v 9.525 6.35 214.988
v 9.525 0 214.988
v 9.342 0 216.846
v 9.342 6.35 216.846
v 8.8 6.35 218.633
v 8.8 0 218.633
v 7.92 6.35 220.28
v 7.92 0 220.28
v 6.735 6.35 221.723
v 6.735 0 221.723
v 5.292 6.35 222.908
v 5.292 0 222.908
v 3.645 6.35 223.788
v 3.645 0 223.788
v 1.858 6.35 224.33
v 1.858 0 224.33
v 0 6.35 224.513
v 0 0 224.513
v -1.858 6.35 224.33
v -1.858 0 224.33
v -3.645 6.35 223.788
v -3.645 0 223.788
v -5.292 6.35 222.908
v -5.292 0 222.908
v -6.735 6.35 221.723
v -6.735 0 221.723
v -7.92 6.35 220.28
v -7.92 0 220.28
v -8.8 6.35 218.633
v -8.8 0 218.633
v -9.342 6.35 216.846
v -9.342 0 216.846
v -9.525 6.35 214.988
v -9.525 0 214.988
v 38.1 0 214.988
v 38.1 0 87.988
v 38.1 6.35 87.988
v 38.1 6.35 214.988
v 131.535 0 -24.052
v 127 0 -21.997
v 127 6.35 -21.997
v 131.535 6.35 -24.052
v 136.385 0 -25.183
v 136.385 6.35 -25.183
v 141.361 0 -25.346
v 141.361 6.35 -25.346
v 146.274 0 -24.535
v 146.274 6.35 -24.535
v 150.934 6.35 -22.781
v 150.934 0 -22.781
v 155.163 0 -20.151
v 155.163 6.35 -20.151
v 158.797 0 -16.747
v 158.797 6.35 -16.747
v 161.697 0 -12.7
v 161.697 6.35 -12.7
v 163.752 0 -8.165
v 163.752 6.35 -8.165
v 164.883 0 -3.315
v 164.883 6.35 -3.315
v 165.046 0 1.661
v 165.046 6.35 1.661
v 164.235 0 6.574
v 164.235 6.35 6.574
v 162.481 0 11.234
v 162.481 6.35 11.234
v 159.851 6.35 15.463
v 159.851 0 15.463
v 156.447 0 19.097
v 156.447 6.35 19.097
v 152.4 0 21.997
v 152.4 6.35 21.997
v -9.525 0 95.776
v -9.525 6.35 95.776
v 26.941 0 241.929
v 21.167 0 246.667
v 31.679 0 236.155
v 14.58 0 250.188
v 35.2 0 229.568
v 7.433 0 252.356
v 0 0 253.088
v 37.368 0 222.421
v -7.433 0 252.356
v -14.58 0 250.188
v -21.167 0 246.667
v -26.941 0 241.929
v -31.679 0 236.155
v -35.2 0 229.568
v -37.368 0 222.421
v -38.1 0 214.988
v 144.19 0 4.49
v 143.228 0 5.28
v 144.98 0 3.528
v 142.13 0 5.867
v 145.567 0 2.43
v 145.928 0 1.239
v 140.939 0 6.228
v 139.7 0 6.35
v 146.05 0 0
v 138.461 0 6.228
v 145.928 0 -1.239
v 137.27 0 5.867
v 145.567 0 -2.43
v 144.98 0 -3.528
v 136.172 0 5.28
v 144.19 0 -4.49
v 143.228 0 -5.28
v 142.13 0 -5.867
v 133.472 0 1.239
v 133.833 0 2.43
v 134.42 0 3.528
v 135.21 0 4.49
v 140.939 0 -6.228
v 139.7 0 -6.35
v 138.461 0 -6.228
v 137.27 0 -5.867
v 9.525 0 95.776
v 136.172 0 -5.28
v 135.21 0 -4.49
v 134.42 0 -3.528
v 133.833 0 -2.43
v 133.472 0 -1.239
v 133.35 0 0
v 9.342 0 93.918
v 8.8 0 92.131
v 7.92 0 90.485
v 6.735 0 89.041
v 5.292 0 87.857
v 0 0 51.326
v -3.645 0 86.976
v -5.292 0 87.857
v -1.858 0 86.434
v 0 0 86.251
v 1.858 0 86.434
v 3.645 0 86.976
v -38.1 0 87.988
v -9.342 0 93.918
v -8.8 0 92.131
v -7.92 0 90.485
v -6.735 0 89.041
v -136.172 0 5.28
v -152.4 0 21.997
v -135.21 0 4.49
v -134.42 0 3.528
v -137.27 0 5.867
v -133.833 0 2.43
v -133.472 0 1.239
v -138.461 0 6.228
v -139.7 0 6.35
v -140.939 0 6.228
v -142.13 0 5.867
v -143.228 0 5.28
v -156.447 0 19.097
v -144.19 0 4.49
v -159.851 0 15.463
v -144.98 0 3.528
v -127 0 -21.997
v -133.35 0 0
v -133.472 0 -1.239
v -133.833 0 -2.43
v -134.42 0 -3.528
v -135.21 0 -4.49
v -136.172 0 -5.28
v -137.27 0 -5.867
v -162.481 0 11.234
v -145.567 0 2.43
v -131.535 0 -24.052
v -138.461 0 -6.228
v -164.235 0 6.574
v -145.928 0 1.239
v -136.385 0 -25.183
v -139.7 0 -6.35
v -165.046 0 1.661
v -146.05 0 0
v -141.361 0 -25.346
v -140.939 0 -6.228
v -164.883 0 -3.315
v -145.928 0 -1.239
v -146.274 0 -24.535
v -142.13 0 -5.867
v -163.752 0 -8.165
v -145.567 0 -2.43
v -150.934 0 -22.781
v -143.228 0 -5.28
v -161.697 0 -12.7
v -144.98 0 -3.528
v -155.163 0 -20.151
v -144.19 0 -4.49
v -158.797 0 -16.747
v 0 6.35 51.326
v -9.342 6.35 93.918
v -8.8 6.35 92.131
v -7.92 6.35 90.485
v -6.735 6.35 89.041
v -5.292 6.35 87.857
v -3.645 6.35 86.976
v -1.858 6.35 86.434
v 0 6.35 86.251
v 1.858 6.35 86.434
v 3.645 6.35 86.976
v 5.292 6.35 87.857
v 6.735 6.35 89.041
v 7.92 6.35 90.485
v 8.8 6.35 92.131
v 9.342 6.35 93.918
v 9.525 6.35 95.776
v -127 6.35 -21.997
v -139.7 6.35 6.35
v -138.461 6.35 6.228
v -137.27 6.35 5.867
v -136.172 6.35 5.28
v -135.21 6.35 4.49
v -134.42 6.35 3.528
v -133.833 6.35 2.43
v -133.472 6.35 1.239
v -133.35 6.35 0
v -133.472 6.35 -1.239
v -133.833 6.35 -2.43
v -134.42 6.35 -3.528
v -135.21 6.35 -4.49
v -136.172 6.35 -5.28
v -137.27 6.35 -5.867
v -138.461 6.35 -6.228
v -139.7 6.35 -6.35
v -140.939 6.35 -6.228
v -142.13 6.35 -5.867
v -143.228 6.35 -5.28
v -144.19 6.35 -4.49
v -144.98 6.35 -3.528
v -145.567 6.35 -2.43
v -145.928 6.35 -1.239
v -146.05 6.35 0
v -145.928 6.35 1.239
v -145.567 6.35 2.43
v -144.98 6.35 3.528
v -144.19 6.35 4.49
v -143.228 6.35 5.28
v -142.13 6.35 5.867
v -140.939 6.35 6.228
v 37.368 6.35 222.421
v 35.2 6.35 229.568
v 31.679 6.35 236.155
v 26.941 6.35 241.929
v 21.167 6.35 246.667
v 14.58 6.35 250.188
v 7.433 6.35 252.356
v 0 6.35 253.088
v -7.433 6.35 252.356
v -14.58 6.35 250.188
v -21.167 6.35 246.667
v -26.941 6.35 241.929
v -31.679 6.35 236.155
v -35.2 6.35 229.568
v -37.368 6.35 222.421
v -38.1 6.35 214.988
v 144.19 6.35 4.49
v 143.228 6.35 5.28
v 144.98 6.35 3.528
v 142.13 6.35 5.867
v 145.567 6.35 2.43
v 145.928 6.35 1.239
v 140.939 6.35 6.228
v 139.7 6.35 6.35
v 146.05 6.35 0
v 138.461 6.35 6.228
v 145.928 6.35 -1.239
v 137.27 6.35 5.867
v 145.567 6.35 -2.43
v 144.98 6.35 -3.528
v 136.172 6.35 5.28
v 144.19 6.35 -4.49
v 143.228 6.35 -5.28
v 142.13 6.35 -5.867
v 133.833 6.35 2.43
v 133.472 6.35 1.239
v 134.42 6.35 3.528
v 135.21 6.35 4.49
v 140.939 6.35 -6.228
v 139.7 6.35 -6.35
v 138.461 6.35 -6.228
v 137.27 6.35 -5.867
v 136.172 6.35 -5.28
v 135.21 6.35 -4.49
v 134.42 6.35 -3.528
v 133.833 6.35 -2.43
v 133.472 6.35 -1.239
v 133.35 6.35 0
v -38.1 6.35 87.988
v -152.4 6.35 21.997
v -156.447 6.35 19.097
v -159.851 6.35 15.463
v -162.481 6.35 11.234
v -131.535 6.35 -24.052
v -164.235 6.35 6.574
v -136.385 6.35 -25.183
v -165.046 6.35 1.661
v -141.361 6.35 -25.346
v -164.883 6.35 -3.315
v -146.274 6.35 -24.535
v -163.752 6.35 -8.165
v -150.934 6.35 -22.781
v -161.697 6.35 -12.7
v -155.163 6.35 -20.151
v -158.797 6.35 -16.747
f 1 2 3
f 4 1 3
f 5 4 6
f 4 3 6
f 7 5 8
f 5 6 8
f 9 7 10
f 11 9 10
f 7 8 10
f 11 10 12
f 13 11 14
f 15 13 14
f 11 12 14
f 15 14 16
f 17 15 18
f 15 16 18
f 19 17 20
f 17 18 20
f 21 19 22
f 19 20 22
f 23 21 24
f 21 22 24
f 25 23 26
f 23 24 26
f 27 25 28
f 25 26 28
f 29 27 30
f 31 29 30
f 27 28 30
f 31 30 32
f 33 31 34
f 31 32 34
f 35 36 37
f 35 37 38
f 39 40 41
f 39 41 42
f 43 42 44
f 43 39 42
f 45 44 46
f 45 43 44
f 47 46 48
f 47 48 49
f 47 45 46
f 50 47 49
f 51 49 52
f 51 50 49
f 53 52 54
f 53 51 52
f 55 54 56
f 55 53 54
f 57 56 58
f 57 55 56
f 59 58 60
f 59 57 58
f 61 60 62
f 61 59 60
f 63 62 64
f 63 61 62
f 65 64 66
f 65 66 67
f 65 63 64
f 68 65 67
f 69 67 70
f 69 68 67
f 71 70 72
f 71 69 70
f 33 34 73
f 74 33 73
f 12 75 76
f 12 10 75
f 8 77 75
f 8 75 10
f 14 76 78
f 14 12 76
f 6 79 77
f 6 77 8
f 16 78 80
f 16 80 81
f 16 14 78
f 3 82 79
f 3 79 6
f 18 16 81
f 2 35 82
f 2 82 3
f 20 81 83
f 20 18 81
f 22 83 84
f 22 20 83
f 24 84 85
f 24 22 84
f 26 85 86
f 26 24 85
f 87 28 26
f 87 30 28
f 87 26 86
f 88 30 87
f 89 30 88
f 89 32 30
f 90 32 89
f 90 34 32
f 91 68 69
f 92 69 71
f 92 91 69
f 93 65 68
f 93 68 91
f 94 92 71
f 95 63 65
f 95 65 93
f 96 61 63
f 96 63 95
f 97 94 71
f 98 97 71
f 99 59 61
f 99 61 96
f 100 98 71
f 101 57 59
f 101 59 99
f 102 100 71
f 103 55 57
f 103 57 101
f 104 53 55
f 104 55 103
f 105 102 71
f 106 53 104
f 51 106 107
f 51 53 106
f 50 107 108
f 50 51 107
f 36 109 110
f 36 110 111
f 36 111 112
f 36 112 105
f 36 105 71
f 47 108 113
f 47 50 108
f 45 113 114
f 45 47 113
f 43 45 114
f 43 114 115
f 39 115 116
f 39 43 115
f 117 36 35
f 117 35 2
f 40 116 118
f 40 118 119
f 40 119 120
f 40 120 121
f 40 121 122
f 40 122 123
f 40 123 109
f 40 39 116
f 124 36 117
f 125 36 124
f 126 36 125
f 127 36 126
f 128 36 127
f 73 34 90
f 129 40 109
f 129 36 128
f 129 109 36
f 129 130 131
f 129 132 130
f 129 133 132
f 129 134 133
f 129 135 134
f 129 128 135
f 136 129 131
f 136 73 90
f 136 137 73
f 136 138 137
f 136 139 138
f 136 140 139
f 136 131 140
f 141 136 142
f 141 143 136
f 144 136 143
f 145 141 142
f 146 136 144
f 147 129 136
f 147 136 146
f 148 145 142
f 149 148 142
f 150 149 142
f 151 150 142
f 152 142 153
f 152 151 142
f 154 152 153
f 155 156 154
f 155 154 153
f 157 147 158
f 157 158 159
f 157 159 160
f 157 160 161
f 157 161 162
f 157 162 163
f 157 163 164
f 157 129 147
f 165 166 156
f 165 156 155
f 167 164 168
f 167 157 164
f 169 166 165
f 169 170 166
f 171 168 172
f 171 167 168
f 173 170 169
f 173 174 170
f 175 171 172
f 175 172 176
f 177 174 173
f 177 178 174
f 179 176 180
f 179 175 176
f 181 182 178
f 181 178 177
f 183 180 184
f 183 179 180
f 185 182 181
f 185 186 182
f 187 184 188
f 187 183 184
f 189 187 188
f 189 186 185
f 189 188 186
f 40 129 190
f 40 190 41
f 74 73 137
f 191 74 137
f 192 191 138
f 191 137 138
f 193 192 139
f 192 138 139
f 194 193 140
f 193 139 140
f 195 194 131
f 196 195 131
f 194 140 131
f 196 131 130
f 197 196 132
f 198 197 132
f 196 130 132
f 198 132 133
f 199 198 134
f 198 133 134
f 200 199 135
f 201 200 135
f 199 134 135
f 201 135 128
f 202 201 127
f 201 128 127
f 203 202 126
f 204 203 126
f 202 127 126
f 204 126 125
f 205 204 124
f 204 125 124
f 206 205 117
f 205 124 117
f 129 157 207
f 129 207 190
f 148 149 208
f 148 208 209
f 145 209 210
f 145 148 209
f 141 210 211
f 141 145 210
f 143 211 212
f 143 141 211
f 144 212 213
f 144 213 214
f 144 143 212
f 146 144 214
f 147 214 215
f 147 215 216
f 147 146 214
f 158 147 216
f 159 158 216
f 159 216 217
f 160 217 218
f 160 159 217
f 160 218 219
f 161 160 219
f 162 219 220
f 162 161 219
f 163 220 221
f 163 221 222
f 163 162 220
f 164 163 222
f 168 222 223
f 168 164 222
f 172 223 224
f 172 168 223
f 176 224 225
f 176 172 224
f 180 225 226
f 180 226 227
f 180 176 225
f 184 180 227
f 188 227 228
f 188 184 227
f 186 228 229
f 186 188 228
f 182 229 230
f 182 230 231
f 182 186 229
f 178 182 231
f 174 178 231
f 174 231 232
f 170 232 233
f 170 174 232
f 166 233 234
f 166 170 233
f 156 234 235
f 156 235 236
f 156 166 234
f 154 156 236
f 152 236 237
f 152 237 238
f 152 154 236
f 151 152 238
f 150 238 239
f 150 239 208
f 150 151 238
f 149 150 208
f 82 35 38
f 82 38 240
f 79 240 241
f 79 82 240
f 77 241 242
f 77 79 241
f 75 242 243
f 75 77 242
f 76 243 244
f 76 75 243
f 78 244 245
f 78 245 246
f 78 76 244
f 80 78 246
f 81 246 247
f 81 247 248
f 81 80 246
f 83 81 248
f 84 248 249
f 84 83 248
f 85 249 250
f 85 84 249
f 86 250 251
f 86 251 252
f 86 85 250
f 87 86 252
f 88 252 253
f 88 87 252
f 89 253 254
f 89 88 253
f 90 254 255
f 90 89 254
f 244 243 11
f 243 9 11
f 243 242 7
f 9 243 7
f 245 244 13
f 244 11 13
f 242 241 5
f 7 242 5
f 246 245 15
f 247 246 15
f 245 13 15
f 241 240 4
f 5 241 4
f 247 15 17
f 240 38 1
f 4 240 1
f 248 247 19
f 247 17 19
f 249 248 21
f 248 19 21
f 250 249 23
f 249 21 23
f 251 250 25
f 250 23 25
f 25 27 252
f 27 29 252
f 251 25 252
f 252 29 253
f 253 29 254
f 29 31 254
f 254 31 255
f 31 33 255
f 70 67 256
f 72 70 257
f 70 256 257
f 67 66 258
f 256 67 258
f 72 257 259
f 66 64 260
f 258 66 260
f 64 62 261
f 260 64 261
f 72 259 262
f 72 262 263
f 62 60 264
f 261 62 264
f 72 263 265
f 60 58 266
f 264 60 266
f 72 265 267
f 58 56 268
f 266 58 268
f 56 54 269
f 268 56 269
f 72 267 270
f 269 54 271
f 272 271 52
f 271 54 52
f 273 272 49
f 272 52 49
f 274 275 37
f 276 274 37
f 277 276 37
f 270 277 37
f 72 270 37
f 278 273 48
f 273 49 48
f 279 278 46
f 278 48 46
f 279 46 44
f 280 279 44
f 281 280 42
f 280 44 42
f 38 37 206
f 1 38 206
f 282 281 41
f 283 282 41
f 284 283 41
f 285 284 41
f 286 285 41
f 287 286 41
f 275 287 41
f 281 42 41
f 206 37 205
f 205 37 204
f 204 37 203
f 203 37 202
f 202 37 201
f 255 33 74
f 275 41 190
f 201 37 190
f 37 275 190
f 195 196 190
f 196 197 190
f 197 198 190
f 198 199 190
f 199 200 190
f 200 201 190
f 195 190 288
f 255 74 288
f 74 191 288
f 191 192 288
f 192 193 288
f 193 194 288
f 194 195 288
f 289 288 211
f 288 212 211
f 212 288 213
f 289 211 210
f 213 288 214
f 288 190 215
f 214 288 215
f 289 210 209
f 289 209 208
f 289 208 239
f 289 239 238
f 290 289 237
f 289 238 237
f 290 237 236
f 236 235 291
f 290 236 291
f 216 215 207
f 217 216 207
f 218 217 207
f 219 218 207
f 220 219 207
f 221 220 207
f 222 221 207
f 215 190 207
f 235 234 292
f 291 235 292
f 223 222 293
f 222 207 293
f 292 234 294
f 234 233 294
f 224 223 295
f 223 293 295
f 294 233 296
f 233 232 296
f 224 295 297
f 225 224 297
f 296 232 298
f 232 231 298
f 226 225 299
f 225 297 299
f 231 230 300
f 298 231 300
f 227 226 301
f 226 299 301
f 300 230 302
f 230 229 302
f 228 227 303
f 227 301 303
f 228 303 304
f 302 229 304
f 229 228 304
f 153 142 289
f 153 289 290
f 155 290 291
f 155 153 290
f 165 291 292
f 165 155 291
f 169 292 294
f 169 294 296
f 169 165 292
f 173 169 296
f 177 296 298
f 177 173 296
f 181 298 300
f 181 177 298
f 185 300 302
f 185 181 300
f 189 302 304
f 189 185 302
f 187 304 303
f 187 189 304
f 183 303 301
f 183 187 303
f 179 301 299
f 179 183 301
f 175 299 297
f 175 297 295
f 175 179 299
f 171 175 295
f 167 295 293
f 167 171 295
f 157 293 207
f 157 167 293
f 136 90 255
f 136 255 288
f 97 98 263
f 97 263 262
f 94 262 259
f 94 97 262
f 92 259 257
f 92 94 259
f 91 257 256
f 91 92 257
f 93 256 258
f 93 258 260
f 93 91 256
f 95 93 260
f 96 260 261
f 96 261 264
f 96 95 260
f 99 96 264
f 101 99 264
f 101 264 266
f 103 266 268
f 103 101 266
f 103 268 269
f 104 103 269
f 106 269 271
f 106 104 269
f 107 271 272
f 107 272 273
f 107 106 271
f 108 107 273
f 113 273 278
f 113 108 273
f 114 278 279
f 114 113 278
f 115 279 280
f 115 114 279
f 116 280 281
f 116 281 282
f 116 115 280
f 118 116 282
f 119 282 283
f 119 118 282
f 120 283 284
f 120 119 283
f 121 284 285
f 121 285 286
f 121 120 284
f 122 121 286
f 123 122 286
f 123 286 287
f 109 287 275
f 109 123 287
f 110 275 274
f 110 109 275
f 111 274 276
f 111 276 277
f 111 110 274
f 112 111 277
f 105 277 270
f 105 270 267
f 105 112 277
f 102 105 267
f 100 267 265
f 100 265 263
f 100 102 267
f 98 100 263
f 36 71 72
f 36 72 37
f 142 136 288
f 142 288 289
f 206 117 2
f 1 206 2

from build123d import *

# Parameters (mm, degrees)
SKETCH1_R           = 6.35
BOSS_EXTRUDE1_DEPTH = 6.35


with BuildPart() as part:
    # Sketch1 → Boss-Extrude1 (new body)
    with BuildSketch(Plane(origin=(0, 0, 0), x_dir=(1, 0, 0), z_dir=(0, 1, 0))):
        with BuildLine():
            Line((-127, 21.997045256), (0, -51.326438931))
            Line((0, -51.326438931), (127, 21.997045256))
            ThreePointArc((127, 21.997045256), (161.697045256, 12.7), (152.4, -21.997045256))
            Line((152.4, -21.997045256), (38.1, -87.988181024))
            Line((38.1, -87.988181024), (38.1, -214.988181024))
            ThreePointArc((38.1, -214.988181024), (0, -253.088181024), (-38.1, -214.988181024))
            Line((-38.1, -214.988181024), (-38.1, -87.988181024))
            Line((-38.1, -87.988181024), (-152.4, -21.997045256))
            ThreePointArc((-152.4, -21.997045256), (-161.697045256, 12.7), (-127, 21.997045256))
        make_face()
        with Locations(Location((-139.7, 0, 0), (0, 0, 270))):
            Circle(SKETCH1_R, mode=Mode.SUBTRACT)
        with Locations(Location((139.7, 0, 0), (0, 0, 270))):
            Circle(SKETCH1_R, mode=Mode.SUBTRACT)
        with BuildLine():
            Line((-9.525, -214.988181024), (-9.525, -95.776438931))
            ThreePointArc((-9.525, -95.776438931), (0, -86.251438931), (9.525, -95.776438931))
            Line((9.525, -95.776438931), (9.525, -214.988181024))
            ThreePointArc((9.525, -214.988181024), (0, -224.513181024), (-9.525, -214.988181024))
        make_face(mode=Mode.SUBTRACT)
    extrude(amount=BOSS_EXTRUDE1_DEPTH)


solid = part.part
